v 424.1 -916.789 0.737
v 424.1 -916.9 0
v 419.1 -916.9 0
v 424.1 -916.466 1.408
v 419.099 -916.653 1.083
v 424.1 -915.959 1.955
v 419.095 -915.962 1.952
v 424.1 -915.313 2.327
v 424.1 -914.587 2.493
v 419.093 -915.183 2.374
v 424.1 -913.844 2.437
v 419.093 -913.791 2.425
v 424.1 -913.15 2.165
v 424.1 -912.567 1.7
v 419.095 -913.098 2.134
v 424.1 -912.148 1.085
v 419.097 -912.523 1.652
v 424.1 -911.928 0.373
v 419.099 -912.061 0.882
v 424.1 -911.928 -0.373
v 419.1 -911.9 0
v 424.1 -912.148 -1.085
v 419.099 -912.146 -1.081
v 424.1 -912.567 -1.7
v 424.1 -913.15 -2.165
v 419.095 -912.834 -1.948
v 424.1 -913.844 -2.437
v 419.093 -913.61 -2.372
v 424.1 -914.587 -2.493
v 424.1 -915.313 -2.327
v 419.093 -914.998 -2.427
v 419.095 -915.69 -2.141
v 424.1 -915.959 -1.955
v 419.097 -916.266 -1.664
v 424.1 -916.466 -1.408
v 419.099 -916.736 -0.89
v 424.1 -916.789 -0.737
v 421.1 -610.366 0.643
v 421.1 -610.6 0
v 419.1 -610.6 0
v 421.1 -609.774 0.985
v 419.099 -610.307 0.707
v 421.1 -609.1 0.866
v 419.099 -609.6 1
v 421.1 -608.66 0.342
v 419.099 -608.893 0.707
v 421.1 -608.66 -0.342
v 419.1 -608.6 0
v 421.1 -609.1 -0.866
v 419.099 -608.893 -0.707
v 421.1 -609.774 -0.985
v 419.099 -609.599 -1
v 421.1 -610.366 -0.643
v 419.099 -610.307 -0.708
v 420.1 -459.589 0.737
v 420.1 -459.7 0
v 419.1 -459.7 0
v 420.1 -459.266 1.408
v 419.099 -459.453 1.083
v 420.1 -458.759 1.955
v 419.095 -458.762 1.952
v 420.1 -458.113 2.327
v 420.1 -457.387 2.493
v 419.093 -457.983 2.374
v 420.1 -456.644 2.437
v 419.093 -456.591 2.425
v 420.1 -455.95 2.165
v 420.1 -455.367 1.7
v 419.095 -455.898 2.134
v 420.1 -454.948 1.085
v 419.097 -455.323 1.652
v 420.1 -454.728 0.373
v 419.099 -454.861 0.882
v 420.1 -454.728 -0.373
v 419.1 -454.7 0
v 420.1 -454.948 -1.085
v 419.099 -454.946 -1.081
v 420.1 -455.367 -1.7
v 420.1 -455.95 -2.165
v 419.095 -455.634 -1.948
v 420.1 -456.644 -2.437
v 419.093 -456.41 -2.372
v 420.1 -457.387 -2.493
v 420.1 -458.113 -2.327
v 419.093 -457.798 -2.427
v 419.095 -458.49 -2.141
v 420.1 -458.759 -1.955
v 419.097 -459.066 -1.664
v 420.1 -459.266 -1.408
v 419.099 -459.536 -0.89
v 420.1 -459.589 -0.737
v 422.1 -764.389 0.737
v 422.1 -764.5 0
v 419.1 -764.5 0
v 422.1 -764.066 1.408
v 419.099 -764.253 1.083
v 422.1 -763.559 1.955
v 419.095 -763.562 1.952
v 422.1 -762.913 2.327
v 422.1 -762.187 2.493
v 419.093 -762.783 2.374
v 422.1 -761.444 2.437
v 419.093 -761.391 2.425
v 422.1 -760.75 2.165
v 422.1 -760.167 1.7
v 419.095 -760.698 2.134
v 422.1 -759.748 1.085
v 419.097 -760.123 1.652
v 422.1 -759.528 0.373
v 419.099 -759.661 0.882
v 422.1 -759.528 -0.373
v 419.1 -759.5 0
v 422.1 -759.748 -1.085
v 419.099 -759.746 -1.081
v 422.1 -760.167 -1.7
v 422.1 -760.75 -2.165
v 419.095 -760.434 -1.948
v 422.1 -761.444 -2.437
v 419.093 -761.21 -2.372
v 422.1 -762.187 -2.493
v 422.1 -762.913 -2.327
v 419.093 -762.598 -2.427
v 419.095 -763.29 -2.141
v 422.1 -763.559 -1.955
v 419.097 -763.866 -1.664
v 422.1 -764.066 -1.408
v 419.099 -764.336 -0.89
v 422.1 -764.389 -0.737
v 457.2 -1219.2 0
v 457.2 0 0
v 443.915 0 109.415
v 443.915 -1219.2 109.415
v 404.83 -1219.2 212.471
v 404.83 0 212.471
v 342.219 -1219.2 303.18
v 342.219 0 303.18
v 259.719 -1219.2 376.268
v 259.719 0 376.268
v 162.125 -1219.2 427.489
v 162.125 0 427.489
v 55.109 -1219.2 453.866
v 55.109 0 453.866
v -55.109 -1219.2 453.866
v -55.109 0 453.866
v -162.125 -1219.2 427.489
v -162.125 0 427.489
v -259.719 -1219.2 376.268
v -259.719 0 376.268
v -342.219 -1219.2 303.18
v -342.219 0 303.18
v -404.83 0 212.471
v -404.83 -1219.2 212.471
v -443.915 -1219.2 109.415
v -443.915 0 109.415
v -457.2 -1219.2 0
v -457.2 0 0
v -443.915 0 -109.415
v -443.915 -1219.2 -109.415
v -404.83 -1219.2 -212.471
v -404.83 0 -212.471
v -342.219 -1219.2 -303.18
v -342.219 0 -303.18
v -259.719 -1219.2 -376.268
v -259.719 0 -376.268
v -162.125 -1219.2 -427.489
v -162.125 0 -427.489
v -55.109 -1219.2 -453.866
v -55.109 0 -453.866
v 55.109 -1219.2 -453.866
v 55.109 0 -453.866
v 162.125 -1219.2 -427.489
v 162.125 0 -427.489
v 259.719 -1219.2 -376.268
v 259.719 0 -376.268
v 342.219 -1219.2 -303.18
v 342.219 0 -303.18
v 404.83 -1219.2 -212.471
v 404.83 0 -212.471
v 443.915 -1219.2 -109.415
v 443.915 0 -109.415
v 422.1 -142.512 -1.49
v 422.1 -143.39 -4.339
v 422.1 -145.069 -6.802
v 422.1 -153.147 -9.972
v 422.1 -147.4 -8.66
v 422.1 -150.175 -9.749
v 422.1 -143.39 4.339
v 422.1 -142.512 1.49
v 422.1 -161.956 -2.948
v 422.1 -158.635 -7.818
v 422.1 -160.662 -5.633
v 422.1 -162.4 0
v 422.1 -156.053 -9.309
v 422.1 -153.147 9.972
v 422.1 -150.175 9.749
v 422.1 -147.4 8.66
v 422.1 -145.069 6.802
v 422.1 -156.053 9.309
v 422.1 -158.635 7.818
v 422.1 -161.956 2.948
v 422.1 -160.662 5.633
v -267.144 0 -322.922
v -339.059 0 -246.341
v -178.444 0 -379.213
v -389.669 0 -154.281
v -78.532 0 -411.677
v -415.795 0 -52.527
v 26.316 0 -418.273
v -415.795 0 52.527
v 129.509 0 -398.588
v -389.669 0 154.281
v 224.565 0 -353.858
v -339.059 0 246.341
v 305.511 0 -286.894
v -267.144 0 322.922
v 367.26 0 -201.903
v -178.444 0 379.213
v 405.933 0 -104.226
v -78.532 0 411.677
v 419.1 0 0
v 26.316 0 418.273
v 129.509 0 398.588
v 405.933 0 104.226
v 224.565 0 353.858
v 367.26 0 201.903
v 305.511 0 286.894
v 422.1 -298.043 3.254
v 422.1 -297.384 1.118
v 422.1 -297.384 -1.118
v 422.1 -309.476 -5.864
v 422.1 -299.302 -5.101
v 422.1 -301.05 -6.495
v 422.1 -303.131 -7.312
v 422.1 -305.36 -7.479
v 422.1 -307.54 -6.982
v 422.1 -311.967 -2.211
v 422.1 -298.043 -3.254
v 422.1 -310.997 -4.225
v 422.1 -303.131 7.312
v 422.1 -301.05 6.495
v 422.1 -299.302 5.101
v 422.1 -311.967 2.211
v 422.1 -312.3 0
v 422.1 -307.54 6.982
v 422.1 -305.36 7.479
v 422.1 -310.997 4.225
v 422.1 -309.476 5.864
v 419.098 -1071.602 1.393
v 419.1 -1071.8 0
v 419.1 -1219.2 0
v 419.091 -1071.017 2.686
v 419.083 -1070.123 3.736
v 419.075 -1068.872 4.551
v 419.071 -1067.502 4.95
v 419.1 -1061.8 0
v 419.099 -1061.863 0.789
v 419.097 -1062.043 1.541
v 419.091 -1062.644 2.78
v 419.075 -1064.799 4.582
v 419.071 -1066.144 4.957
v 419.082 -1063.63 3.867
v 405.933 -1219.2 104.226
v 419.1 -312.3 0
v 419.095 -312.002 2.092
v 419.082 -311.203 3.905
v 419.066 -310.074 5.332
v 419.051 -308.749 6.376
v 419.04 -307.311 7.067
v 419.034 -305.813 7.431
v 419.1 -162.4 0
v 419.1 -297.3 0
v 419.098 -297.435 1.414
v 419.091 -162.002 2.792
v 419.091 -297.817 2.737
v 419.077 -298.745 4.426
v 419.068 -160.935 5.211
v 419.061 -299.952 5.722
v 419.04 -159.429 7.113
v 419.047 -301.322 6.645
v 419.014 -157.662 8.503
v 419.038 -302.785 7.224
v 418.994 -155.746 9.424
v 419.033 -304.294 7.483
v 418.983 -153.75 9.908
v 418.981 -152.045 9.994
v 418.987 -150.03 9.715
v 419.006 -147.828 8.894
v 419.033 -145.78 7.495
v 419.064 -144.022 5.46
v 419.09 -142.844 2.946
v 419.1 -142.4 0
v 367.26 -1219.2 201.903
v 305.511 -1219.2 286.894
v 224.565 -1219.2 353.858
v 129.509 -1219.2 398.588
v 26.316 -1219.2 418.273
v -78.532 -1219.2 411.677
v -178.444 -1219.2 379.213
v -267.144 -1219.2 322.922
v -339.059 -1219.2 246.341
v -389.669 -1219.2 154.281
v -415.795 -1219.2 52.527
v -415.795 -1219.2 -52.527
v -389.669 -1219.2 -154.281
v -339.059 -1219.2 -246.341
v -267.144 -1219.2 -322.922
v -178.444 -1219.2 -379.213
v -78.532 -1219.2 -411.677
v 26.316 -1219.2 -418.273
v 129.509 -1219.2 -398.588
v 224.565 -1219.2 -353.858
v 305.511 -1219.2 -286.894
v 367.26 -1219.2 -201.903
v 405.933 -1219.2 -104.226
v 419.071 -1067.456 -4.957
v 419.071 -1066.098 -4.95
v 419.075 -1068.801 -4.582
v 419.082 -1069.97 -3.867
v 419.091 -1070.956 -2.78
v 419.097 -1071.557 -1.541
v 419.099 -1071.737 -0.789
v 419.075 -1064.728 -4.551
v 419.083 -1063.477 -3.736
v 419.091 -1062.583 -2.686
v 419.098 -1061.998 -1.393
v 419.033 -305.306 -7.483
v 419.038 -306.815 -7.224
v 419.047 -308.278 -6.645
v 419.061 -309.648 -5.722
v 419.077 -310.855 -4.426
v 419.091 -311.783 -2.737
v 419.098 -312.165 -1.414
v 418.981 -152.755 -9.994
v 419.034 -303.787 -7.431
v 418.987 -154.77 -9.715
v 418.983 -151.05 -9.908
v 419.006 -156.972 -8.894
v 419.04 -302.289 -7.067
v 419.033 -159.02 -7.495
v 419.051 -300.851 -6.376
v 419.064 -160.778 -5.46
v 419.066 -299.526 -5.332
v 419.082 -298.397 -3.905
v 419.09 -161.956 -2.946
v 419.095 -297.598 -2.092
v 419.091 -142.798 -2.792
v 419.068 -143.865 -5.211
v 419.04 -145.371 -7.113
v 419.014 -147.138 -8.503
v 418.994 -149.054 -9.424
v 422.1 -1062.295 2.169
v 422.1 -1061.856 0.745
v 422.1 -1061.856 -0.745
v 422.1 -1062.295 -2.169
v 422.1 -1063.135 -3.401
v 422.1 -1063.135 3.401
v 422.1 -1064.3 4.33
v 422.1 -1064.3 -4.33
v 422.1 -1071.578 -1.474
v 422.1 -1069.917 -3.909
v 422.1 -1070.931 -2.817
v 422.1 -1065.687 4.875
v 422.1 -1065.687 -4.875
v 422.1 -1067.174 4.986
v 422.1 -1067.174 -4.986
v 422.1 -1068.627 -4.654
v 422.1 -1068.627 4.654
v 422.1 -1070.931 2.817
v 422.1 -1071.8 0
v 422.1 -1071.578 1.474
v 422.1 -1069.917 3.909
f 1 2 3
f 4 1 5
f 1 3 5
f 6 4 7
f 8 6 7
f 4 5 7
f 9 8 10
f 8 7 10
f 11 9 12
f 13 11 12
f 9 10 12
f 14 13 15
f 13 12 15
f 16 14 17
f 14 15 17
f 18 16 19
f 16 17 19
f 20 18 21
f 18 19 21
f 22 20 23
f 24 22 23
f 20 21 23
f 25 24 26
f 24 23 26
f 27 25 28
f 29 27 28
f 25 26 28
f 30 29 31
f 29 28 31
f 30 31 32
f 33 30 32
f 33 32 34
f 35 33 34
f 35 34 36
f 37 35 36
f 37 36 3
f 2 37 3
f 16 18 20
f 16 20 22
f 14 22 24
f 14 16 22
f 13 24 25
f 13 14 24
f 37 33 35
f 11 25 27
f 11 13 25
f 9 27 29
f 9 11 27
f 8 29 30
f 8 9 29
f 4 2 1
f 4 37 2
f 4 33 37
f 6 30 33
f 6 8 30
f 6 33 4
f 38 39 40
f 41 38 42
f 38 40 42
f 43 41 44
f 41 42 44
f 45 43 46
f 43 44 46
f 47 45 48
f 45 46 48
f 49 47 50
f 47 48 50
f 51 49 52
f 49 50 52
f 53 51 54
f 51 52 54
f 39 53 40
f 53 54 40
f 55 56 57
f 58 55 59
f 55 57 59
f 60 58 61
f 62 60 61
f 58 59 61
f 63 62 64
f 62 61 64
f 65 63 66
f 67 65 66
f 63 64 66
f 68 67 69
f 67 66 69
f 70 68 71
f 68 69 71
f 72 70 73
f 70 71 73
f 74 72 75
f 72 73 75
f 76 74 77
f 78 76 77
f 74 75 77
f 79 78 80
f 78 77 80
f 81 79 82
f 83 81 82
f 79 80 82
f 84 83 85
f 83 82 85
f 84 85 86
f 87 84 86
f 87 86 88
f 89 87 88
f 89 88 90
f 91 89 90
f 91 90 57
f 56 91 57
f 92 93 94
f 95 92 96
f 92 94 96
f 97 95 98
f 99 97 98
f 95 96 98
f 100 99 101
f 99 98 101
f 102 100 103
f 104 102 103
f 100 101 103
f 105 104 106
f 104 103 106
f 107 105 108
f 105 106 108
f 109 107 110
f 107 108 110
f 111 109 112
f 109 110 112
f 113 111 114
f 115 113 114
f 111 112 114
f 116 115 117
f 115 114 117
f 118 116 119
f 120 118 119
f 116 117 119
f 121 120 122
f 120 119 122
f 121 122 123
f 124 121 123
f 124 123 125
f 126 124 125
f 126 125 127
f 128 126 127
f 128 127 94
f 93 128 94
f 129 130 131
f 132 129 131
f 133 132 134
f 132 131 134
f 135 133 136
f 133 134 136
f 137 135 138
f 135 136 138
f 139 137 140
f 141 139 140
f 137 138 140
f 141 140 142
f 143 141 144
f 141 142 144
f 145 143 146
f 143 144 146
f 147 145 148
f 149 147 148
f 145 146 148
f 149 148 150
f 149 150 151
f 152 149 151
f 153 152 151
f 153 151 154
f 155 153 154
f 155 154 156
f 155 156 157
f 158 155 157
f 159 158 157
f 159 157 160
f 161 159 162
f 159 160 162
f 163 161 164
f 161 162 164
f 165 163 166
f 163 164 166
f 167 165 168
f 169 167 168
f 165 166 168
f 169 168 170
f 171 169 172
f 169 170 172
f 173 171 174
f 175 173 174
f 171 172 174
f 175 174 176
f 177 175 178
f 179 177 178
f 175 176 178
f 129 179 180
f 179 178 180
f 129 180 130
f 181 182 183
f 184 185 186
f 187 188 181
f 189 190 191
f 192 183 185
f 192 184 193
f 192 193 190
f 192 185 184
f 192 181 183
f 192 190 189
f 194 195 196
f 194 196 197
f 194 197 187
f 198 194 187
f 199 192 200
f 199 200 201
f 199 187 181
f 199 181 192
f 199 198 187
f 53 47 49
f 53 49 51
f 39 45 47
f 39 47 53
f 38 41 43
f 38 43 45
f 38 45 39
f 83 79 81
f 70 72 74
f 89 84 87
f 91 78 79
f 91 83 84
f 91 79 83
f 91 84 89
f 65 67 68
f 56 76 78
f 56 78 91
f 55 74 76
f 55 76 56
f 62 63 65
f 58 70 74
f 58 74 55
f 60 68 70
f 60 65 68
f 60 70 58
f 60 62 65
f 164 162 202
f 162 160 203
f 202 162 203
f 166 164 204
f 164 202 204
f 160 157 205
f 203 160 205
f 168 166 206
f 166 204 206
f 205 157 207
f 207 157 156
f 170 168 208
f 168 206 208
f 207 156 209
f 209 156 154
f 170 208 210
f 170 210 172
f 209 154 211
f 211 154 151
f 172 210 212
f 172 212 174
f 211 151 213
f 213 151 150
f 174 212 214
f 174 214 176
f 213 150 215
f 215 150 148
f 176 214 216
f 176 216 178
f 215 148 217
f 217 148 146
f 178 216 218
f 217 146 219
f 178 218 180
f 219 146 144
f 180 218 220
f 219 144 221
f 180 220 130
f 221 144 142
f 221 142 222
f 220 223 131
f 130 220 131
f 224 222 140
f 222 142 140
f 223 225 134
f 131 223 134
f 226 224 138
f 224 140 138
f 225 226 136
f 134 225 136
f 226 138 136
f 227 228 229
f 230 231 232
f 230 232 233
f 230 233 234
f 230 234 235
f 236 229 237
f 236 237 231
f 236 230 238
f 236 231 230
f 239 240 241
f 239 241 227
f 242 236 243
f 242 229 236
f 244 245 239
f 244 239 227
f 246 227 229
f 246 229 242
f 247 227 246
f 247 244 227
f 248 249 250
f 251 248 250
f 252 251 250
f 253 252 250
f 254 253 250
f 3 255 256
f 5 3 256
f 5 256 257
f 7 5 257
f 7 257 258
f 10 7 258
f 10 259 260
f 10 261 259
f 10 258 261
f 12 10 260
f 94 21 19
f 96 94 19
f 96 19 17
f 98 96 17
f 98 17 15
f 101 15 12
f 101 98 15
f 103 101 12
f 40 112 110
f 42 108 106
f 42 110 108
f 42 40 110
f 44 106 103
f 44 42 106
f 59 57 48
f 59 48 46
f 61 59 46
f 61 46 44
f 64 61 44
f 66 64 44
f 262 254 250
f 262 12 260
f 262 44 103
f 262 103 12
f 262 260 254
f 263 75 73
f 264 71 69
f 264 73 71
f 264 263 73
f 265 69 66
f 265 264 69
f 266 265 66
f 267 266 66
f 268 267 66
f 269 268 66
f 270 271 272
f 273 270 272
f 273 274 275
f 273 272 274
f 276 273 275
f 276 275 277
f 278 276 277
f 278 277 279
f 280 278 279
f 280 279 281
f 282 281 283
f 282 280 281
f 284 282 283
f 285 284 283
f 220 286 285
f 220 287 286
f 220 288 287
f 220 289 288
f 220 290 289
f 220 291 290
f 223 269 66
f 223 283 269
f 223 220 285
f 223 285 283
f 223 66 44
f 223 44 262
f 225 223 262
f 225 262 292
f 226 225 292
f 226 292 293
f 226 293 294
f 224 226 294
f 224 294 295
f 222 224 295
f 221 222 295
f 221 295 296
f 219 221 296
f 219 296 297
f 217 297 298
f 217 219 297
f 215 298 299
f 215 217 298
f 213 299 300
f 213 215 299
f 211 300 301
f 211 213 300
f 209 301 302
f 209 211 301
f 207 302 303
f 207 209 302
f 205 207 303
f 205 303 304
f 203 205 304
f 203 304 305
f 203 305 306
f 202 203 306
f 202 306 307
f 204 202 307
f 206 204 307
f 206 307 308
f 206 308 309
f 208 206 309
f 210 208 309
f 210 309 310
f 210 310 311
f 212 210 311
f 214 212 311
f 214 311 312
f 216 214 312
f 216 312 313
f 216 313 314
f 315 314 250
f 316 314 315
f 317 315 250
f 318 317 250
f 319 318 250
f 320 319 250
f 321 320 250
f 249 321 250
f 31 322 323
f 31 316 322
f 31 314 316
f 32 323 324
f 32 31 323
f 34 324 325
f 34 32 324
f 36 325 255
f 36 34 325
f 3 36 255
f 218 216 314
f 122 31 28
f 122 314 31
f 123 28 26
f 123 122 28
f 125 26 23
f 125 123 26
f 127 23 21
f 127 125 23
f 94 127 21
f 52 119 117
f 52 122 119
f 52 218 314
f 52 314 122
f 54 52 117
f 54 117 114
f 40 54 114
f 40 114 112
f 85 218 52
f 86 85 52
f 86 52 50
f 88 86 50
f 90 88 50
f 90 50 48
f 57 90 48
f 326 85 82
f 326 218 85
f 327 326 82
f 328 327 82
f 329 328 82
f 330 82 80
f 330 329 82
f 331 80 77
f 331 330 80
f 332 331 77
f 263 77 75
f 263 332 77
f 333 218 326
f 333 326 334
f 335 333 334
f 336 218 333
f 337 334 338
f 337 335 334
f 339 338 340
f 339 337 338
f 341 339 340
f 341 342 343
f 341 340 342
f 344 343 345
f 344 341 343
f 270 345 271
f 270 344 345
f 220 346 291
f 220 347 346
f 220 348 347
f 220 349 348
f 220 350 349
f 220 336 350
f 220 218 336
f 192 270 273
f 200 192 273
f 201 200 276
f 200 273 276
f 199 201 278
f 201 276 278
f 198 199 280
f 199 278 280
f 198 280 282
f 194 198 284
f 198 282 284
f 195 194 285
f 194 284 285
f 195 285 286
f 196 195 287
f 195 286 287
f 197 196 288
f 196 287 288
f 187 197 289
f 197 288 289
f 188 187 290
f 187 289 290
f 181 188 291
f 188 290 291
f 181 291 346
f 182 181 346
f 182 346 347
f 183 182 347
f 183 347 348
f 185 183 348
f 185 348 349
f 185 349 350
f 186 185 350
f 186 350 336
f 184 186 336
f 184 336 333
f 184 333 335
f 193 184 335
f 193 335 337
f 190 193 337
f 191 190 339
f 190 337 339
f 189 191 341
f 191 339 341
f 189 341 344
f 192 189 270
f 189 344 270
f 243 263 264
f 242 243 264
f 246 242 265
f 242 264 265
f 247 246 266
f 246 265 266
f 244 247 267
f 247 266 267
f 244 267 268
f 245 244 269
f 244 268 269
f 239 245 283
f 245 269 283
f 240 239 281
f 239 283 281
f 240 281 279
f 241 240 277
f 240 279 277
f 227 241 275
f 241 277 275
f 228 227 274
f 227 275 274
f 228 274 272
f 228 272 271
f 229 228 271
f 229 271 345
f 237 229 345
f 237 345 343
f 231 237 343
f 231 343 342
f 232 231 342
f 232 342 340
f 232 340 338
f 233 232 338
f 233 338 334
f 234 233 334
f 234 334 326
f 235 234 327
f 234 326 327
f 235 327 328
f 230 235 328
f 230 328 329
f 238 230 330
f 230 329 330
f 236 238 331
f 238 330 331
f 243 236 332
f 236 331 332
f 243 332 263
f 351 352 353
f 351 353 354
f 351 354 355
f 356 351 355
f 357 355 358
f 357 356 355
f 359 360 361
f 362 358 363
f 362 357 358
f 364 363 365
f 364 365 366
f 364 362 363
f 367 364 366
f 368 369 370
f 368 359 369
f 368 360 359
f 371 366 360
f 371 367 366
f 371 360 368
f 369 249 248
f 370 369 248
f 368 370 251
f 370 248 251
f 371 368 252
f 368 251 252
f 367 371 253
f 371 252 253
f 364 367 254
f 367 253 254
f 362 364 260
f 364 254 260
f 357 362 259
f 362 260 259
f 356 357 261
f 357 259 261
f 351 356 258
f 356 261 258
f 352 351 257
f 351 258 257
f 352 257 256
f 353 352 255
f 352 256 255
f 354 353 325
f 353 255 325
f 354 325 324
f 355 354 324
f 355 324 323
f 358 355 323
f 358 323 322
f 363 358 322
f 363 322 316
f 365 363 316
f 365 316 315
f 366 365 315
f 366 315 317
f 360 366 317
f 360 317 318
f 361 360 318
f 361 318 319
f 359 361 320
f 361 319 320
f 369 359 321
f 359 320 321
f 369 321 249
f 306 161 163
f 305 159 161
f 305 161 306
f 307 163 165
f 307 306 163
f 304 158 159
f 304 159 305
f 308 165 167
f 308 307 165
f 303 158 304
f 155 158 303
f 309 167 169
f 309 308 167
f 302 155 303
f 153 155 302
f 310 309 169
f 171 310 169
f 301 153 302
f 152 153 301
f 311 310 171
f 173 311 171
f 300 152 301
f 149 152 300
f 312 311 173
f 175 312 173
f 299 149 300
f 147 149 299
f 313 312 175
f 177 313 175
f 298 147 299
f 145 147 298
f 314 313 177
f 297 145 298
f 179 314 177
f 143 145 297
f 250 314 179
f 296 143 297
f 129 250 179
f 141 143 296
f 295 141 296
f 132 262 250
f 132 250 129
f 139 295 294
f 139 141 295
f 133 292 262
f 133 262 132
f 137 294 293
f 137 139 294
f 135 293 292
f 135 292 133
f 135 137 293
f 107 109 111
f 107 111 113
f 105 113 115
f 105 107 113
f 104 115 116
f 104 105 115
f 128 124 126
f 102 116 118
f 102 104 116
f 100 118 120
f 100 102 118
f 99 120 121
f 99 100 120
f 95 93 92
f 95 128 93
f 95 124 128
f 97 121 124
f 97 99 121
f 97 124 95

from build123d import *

# Parameters (mm, degrees)
F0_R      = 457.2
F0_R_2    = 419.1
F1_DEPTH  = 1219.2
F5_R      = 10
F6_DEPTH  = 103
F7_R      = 7.5
F8_DEPTH  = 103
F9_R      = 2.5
F10_DEPTH = 101
F11_R     = 1
F12_DEPTH = 102
F13_R     = 2.5
F14_DEPTH = 103
F15_R     = 2.5
F16_DEPTH = 105
F17_R     = 5
F18_DEPTH = 103


with BuildPart() as f1:
    # F0 (on Front) → F1 (new body)
    with BuildSketch(Plane.XZ):
        Circle(F0_R)
        Circle(F0_R_2, mode=Mode.SUBTRACT)
    extrude(amount=F1_DEPTH)

    # F5 (on offset) → F6 (cut)
    with BuildSketch(Plane(origin=(319.1, 0, 0), x_dir=(0, -1, 0), z_dir=(-1, 0, 0))):
        with Locations((152.4, 0)):
            Circle(F5_R)
    extrude(amount=-F6_DEPTH, mode=Mode.SUBTRACT)

    # F7 (on offset) → F8 (cut)
    with BuildSketch(Plane(origin=(319.1, 0, 0), x_dir=(0, -1, 0), z_dir=(-1, 0, 0))):
        with Locations((304.8, 0)):
            Circle(F7_R)
    extrude(amount=-F8_DEPTH, mode=Mode.SUBTRACT)

    # F9 (on offset) → F10 (cut)
    with BuildSketch(Plane(origin=(319.1, 0, 0), x_dir=(0, -1, 0), z_dir=(-1, 0, 0))):
        with Locations((457.2, 0)):
            Circle(F9_R)
    extrude(amount=-F10_DEPTH, mode=Mode.SUBTRACT)

    # F11 (on offset) → F12 (cut)
    with BuildSketch(Plane(origin=(319.1, 0, 0), x_dir=(0, -1, 0), z_dir=(-1, 0, 0))):
        with Locations((609.6, 0)):
            Circle(F11_R)
    extrude(amount=-F12_DEPTH, mode=Mode.SUBTRACT)

    # F13 (on offset) → F14 (cut)
    with BuildSketch(Plane(origin=(319.1, 0, 0), x_dir=(0, -1, 0), z_dir=(-1, 0, 0))):
        with Locations((762, 0)):
            Circle(F13_R)
    extrude(amount=-F14_DEPTH, mode=Mode.SUBTRACT)

    # F15 (on offset) → F16 (cut)
    with BuildSketch(Plane(origin=(319.1, 0, 0), x_dir=(0, -1, 0), z_dir=(-1, 0, 0))):
        with Locations((914.4, 0)):
            Circle(F15_R)
    extrude(amount=-F16_DEPTH, mode=Mode.SUBTRACT)

    # F17 (on offset) → F18 (cut)
    with BuildSketch(Plane(origin=(319.1, 0, 0), x_dir=(0, -1, 0), z_dir=(-1, 0, 0))):
        with Locations((1066.8, 0)):
            Circle(F17_R)
    extrude(amount=-F18_DEPTH, mode=Mode.SUBTRACT)


solid = f1.part
